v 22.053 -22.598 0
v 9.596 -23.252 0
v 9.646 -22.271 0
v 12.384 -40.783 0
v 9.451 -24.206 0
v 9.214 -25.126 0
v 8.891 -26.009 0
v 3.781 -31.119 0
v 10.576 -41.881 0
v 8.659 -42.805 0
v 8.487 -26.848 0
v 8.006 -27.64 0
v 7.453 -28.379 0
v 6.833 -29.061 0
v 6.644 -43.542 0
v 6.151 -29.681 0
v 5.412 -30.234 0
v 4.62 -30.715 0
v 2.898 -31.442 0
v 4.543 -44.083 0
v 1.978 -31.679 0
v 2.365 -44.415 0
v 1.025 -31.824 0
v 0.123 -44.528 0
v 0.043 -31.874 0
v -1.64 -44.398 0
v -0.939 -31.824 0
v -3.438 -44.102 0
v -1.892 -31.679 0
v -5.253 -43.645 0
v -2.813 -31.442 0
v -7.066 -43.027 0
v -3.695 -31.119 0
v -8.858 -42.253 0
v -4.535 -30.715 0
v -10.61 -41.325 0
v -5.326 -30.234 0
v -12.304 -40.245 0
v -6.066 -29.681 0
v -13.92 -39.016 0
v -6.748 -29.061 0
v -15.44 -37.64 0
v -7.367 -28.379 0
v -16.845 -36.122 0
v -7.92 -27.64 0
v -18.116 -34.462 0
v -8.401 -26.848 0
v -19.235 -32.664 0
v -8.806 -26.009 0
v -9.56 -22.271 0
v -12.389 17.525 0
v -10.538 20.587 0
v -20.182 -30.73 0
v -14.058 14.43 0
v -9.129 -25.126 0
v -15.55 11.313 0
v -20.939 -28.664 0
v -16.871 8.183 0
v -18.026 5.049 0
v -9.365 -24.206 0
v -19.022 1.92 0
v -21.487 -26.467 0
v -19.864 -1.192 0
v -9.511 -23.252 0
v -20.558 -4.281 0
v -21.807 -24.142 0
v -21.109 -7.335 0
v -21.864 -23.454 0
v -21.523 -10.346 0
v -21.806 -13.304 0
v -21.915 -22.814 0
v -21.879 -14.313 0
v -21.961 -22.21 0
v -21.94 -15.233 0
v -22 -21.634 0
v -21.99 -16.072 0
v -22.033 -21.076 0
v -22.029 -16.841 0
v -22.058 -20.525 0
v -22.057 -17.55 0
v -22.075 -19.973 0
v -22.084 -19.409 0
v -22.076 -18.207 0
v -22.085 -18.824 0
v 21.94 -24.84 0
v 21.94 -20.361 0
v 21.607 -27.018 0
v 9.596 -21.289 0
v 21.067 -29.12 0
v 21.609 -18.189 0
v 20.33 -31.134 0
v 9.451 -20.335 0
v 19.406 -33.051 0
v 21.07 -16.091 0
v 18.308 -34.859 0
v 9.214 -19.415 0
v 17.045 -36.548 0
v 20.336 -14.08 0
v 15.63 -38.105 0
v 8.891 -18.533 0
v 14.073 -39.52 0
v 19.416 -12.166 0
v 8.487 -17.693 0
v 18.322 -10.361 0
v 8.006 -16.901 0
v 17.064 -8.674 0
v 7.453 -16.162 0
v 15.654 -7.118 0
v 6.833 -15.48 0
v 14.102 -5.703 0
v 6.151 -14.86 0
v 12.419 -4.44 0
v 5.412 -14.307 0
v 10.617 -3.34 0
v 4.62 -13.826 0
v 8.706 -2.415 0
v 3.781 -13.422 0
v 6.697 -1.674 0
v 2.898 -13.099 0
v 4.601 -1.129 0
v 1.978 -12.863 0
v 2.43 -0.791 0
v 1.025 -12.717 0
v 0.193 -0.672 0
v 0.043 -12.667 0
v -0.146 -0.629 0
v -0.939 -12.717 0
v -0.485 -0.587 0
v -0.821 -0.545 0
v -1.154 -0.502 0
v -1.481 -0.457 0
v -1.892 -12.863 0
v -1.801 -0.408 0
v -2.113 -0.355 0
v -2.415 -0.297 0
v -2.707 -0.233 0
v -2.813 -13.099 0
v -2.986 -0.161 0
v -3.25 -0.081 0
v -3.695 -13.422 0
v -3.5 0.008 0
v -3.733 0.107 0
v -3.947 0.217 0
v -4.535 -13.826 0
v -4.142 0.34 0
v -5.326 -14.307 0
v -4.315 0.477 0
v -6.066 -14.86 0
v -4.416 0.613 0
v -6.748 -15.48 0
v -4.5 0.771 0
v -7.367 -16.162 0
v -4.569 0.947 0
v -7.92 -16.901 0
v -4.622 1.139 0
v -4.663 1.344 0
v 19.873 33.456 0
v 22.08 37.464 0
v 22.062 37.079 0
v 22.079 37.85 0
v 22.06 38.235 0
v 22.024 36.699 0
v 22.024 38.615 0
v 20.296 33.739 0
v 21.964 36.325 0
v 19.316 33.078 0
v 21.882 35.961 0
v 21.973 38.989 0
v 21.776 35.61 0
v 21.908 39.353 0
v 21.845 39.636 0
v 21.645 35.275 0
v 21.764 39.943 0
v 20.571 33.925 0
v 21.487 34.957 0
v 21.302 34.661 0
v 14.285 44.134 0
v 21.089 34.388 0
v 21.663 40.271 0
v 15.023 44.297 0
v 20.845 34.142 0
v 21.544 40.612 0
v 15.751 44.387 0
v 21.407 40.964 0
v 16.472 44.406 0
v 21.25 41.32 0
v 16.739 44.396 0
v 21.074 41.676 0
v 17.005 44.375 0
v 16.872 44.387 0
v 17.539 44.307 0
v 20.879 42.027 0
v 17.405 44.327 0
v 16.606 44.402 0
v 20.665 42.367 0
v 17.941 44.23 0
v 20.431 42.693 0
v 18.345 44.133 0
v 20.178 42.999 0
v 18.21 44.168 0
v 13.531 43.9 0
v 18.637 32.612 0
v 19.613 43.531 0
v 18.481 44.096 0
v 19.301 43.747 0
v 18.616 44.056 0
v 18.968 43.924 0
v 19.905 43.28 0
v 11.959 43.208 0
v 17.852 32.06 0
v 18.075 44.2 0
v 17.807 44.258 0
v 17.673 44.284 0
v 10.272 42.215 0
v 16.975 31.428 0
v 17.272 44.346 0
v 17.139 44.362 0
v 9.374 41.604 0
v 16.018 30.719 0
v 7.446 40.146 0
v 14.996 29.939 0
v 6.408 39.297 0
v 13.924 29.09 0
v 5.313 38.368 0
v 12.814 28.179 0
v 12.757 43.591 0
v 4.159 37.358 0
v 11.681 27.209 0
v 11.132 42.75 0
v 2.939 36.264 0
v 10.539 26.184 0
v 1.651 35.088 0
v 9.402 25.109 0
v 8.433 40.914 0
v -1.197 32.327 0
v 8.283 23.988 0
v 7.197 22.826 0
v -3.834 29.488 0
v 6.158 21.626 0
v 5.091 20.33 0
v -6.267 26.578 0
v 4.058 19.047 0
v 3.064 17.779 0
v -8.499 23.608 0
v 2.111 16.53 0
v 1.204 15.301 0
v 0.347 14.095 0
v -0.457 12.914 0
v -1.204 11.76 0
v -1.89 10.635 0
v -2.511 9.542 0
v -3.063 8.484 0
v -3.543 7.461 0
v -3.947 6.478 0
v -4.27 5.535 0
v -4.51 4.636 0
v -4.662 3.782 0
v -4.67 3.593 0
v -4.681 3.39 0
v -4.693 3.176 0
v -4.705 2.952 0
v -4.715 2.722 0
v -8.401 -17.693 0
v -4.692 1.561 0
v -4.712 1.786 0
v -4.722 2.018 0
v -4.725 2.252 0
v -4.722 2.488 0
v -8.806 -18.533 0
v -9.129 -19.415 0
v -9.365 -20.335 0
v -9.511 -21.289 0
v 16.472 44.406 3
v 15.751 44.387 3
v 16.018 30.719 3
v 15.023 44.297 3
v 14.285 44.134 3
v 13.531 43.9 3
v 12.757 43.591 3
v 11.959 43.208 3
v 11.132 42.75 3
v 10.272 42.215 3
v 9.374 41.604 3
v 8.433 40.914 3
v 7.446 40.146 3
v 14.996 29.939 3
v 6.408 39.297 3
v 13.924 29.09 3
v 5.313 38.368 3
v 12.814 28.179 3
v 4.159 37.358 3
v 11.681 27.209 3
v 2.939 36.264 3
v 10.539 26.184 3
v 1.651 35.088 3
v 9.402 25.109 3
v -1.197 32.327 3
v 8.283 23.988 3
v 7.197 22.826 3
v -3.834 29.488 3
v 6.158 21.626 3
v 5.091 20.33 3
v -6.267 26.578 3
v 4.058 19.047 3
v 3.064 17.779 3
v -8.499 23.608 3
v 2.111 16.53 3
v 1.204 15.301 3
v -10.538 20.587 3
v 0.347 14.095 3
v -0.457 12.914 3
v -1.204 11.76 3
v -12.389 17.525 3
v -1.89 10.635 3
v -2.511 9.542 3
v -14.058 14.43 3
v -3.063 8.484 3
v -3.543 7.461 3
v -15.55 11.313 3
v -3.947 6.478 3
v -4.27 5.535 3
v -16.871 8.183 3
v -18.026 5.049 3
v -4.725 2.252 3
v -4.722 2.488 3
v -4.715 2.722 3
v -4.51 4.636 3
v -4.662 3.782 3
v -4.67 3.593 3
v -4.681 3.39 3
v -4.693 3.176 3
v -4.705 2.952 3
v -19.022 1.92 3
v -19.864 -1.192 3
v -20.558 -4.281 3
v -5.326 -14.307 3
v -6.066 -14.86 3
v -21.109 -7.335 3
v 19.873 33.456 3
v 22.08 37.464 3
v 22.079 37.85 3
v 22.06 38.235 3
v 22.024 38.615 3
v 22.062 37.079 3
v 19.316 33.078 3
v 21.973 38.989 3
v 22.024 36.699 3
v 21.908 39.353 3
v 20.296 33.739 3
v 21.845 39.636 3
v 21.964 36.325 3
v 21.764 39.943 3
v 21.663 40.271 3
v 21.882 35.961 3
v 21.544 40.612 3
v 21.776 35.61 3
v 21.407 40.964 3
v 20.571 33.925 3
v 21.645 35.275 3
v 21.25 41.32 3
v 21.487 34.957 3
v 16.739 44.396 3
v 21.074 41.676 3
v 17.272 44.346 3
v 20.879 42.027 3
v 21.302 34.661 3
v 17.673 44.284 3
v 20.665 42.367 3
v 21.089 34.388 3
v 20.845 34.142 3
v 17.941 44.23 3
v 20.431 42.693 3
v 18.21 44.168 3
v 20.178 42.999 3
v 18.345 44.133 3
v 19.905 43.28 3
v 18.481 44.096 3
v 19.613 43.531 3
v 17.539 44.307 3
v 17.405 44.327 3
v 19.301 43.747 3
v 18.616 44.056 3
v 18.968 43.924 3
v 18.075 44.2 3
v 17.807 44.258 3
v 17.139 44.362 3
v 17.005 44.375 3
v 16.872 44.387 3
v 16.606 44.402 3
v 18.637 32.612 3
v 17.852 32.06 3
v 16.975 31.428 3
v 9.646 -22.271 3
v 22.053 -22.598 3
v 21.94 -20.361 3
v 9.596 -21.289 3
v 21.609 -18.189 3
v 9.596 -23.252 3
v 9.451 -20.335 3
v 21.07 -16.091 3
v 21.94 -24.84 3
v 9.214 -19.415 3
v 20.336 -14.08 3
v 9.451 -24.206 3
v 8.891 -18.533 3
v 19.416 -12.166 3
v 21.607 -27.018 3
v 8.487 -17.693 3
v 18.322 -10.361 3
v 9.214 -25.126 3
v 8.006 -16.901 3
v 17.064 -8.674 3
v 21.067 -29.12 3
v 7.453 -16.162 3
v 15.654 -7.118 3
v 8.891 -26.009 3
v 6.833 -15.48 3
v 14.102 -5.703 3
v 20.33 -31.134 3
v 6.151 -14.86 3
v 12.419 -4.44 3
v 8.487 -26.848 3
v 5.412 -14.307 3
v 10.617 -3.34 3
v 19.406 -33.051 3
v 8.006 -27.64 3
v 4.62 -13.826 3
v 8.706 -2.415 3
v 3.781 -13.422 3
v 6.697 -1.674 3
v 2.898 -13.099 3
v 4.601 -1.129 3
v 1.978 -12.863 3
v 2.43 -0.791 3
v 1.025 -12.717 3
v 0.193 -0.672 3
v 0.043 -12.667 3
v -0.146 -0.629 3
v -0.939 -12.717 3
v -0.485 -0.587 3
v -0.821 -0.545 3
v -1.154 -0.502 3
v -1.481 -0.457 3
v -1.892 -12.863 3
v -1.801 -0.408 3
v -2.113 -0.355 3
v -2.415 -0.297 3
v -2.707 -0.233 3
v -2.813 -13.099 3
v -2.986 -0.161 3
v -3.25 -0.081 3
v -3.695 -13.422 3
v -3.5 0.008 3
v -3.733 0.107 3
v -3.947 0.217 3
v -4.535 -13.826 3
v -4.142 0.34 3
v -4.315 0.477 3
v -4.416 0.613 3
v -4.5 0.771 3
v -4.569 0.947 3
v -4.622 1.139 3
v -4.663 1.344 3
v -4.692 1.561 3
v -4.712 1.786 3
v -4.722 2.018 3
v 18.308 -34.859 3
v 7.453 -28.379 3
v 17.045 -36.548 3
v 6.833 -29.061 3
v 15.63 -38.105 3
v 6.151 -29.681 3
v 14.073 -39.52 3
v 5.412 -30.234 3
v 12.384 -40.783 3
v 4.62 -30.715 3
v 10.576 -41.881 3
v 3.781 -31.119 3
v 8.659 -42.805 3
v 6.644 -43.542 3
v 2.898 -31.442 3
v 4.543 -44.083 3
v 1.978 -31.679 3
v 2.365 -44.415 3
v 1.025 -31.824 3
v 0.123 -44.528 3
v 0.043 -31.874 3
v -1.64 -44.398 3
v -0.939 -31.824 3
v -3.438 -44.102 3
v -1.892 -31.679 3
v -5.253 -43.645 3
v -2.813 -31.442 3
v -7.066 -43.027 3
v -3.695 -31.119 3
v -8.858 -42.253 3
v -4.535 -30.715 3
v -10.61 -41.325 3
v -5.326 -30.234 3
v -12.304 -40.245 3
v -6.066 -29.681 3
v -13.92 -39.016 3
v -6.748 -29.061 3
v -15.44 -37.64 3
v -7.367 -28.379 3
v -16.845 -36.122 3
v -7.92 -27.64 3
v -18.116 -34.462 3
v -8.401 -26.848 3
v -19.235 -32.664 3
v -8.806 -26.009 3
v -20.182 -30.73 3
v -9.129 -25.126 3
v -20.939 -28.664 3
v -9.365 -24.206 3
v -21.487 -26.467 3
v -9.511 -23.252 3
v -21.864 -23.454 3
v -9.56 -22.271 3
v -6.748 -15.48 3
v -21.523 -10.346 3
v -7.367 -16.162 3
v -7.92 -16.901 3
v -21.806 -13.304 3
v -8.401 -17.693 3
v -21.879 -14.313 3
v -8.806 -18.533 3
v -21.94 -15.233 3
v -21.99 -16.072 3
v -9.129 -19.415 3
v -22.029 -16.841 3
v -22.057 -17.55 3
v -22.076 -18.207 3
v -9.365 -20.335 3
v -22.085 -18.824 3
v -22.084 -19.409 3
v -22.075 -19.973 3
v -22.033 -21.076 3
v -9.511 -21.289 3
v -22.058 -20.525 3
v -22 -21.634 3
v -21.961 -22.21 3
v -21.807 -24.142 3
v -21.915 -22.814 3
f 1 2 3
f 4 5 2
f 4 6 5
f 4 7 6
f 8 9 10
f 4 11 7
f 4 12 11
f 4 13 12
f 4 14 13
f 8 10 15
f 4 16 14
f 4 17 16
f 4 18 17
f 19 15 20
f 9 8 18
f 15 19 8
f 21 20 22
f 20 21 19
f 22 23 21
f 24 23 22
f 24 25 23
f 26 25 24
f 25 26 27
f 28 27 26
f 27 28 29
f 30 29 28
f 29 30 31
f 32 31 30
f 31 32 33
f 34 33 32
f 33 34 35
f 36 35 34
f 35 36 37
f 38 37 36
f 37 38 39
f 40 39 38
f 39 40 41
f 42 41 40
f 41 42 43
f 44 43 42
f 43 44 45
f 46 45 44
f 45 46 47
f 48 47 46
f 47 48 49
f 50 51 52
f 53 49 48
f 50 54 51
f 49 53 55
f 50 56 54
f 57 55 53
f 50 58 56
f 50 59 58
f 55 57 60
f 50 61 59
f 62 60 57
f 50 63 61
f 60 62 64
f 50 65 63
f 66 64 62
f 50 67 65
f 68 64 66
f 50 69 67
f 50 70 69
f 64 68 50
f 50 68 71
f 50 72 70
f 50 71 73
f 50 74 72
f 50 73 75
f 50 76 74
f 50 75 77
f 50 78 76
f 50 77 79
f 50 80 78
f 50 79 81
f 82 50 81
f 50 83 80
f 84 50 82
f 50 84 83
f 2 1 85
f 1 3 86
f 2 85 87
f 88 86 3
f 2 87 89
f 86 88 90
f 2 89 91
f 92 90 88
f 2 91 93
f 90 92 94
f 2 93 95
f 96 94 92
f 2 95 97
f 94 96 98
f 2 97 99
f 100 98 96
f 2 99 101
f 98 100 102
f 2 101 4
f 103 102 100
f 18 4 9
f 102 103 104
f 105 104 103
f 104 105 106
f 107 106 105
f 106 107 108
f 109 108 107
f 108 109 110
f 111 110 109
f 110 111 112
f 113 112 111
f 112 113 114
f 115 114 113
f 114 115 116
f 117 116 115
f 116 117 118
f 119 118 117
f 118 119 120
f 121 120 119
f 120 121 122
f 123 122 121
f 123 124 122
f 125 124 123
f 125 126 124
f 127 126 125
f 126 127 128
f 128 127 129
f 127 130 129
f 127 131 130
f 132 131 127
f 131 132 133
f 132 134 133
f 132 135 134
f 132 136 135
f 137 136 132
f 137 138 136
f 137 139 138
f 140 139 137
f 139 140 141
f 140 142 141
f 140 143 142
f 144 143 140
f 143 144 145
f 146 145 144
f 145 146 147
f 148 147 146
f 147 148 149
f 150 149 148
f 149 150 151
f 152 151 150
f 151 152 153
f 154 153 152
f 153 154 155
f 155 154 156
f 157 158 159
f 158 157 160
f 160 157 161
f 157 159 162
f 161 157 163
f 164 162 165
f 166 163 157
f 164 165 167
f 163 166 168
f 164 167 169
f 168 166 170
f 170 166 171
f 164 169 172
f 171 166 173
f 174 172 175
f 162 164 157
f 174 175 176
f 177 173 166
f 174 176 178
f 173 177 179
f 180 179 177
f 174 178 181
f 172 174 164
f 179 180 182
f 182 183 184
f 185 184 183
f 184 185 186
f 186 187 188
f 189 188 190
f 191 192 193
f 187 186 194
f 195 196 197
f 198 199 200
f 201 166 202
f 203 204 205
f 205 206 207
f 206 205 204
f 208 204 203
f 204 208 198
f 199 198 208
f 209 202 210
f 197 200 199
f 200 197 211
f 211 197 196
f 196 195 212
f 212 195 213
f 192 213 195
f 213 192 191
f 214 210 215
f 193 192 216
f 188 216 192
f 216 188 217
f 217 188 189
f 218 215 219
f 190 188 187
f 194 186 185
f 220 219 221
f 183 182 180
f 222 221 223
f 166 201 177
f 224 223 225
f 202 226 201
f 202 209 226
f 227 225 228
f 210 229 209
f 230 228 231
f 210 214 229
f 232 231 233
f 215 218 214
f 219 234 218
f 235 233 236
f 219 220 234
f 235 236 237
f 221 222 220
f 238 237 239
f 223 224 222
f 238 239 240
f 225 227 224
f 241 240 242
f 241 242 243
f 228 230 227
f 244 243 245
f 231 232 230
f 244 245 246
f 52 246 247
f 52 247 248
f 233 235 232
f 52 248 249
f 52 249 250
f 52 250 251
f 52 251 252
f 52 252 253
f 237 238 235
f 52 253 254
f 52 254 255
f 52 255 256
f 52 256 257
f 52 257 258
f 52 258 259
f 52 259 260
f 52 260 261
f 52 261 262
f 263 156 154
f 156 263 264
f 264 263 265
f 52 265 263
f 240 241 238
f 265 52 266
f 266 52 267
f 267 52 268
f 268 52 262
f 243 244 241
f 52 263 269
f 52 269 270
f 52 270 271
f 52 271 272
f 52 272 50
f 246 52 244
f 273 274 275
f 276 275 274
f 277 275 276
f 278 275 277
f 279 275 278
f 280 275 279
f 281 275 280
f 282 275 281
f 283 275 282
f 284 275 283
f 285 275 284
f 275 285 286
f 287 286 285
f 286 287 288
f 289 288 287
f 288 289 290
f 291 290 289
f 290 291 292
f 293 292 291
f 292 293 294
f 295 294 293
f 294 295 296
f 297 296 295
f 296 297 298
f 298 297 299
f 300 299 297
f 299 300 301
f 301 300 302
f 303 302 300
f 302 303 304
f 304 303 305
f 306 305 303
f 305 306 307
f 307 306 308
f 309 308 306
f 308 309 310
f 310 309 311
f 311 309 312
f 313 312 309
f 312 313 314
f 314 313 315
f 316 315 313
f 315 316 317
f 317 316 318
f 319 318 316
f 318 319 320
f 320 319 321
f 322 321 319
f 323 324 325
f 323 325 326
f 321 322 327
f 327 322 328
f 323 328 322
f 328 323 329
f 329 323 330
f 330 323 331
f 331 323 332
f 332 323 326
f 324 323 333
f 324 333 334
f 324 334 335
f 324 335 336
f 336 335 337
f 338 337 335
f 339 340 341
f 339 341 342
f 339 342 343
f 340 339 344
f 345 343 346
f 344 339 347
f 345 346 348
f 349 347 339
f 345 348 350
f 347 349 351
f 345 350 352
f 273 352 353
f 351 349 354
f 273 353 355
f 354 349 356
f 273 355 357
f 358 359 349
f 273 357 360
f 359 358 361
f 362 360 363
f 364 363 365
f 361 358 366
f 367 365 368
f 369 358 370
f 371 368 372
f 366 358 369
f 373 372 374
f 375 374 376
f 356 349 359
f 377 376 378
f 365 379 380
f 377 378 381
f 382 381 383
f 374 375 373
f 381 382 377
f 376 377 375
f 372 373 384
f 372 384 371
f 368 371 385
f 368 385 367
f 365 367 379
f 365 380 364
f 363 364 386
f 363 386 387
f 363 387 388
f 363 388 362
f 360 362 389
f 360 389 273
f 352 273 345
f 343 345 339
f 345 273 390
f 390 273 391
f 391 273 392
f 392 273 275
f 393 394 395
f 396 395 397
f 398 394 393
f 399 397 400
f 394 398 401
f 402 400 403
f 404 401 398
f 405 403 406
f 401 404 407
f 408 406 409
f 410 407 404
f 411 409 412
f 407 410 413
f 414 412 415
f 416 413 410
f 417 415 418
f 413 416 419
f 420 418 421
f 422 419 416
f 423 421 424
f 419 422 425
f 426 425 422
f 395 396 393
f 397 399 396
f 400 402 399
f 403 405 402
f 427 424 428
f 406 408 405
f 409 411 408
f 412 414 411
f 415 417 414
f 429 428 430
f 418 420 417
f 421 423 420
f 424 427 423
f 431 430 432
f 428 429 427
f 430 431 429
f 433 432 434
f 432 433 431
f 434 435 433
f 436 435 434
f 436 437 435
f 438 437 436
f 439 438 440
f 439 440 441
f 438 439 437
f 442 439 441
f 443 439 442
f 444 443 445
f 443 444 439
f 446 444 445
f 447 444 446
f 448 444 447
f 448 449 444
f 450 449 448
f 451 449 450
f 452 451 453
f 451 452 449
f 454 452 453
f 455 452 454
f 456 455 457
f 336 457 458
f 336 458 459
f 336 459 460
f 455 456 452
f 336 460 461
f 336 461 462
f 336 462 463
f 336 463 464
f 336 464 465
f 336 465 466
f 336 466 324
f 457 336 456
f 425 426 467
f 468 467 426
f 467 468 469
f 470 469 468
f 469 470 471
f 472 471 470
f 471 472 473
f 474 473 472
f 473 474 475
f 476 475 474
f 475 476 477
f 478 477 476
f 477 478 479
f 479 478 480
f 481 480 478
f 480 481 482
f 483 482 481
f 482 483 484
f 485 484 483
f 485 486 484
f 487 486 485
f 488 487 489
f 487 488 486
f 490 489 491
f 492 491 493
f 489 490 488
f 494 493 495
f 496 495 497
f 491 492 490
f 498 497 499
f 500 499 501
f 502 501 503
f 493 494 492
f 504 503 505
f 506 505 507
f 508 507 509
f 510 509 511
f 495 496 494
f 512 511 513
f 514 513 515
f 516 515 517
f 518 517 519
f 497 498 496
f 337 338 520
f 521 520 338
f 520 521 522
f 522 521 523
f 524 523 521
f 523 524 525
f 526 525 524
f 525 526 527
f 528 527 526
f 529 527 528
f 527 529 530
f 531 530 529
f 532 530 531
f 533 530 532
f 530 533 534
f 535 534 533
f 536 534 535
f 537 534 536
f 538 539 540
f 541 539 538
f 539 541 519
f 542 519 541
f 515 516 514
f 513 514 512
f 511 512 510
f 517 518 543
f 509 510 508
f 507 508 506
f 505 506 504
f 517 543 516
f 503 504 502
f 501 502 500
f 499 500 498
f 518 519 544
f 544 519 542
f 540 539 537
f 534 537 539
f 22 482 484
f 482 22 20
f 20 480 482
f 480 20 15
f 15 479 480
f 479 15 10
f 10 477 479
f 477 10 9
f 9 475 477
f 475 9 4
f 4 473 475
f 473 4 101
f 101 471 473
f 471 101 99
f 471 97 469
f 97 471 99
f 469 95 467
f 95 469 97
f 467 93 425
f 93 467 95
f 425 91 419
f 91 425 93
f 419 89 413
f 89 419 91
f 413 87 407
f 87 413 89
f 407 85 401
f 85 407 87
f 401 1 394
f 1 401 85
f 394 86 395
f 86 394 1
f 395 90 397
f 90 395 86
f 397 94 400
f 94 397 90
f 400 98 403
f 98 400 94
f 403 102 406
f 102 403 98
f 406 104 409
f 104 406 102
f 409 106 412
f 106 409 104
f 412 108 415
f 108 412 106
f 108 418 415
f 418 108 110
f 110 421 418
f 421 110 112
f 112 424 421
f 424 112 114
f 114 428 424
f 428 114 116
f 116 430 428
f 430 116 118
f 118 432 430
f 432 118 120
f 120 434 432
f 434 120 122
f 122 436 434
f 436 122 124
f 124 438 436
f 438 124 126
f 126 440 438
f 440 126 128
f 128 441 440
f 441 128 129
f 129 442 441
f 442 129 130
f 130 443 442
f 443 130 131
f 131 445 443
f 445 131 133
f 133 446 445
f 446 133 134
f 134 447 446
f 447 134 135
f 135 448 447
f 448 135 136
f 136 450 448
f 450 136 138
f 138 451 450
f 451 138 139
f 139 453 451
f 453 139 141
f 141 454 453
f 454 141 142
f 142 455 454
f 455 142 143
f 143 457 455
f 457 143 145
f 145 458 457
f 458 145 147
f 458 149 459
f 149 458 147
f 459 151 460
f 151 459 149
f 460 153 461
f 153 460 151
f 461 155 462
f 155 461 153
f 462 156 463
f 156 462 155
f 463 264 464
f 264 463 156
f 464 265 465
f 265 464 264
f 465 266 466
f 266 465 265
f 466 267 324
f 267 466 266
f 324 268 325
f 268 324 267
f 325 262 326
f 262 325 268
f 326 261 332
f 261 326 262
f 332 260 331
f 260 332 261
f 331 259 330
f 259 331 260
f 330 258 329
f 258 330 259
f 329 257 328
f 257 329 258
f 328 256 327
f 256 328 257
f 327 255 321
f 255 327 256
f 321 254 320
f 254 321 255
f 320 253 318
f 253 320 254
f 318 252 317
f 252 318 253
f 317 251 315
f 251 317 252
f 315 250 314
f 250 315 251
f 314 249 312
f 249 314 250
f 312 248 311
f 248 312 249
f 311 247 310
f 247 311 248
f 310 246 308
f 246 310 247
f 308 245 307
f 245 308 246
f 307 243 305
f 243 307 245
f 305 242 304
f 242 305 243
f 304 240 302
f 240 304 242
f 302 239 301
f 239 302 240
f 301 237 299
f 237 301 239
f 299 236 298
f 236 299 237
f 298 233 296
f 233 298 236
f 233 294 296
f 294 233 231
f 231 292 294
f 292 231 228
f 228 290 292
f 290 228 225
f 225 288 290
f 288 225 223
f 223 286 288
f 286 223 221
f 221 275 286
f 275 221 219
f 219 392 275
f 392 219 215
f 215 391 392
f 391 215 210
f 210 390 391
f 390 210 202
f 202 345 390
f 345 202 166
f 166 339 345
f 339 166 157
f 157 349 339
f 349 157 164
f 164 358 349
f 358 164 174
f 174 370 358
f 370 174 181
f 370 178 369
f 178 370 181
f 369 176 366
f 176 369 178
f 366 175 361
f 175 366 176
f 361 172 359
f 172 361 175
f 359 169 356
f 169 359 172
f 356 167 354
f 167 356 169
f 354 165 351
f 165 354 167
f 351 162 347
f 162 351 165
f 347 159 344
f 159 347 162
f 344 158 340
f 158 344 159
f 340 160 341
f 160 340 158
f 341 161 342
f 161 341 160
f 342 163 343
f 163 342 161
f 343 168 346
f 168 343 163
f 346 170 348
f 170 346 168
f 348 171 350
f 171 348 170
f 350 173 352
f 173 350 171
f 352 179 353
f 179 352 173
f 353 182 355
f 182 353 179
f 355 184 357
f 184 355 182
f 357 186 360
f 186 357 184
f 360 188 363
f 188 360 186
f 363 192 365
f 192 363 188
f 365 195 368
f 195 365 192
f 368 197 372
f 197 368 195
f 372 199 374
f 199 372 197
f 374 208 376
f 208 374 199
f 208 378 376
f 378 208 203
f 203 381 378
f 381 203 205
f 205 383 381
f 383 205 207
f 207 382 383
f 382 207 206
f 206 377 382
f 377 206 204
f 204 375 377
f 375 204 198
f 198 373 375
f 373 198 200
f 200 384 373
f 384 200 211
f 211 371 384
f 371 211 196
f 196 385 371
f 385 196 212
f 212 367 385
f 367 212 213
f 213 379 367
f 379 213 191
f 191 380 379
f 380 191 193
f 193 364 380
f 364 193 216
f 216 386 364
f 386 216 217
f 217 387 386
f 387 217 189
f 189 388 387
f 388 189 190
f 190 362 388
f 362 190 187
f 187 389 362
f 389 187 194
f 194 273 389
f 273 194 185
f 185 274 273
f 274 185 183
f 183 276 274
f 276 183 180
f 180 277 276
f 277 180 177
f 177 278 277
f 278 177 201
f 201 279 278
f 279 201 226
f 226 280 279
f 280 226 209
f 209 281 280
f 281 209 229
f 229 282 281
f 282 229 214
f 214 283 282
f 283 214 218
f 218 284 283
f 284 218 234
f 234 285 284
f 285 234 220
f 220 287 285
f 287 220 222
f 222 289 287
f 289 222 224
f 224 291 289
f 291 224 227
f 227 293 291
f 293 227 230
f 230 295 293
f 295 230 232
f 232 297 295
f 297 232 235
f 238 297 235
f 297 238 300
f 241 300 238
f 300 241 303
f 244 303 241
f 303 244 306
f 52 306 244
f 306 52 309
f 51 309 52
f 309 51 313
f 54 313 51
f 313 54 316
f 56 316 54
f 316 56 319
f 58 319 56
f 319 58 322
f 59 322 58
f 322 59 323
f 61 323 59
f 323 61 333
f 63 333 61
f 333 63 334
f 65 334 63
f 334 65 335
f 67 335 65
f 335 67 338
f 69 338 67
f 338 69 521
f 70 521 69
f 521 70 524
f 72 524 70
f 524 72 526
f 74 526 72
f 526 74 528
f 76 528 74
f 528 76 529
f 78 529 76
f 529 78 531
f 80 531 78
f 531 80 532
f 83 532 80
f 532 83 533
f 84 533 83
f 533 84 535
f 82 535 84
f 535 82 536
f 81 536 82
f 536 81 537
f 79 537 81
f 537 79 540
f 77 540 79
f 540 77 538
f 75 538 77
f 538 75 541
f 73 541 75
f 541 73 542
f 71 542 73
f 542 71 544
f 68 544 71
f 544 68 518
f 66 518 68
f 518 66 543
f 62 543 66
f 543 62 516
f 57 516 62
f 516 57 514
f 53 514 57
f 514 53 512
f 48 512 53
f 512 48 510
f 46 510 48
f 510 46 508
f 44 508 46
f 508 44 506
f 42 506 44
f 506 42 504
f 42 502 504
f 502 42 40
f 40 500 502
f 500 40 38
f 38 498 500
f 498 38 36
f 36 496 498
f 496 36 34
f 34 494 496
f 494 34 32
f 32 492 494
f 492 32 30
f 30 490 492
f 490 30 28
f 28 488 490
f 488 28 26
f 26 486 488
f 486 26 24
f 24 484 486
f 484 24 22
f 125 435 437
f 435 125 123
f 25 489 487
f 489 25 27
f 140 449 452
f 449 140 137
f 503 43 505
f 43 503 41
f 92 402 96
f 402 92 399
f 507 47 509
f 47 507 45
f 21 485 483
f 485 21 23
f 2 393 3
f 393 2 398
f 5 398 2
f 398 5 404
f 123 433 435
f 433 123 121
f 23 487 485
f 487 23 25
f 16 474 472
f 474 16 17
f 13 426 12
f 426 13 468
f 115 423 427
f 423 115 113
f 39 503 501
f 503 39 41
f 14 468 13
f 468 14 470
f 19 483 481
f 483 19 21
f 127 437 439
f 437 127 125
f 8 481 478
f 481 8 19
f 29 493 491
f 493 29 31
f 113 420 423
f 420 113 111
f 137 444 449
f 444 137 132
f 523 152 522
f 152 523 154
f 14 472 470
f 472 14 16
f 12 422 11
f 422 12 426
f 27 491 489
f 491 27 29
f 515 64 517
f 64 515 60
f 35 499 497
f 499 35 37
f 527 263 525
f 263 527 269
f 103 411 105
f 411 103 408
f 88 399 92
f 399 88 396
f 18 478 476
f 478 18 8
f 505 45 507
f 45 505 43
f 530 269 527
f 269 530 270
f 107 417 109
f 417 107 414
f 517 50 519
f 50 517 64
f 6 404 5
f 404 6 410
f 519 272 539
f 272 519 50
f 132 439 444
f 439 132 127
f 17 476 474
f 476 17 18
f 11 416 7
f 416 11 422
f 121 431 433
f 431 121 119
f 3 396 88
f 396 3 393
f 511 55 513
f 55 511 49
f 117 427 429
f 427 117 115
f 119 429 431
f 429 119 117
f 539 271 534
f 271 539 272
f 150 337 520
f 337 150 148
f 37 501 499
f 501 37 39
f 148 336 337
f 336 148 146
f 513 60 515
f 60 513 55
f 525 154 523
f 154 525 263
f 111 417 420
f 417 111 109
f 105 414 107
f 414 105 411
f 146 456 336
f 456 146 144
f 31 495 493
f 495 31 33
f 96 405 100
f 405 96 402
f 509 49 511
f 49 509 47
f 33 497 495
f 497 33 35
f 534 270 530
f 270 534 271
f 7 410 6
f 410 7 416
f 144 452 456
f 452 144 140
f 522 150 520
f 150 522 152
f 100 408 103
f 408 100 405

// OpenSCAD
// Generated from 交通部公路局（原交通部公路總局）「新式號牌使用之英文字、數字字體」author trace
fudge = 0.1;

module glyph_2012_6(h = 3) {
  difference() {
    linear_extrude(height = h)
      polygon(points = [[16.4725, 44.4064], [15.7511, 44.3869], [15.0234, 44.2966], [14.2848, 44.1344], [13.5309, 43.8996], [12.7572, 43.5912], [11.9591, 43.2083], [11.1322, 42.75], [10.2719, 42.2155], [9.3739, 41.6039], [8.4335, 40.9142], [7.4463, 40.1457], [6.4078, 39.2973], [5.3134, 38.3682], [4.1588, 37.3576], [2.9393, 36.2645], [1.6506, 35.088], [-1.1973, 32.3275], [-3.8345, 29.4878], [-6.2666, 26.5781], [-8.4993, 23.6081], [-10.5383, 20.5871], [-12.3893, 17.5247], [-14.0579, 14.4302], [-15.5498, 11.313], [-16.8707, 8.1828], [-18.0263, 5.0488], [-19.0223, 1.9205], [-19.8643, -1.1925], [-20.5579, -4.281], [-21.109, -7.3353], [-21.5231, -10.3461], [-21.8059, -13.3039], [-21.879, -14.3135], [-21.9402, -15.2331], [-21.9901, -16.0725], [-22.029, -16.8415], [-22.0574, -17.5499], [-22.0758, -18.2075], [-22.0846, -18.824], [-22.0842, -19.4093], [-22.0752, -19.9732], [-22.0579, -20.5254], [-22.0329, -21.0758], [-22.0005, -21.6341], [-21.9612, -22.2101], [-21.9155, -22.8137], [-21.8638, -23.4545], [-21.8066, -24.1425], [-21.4866, -26.4668], [-20.9387, -28.6636], [-20.1818, -30.7302], [-19.2346, -32.6638], [-18.116, -34.4618], [-16.8448, -36.1216], [-15.4398, -37.6404], [-13.9198, -39.0157], [-12.3036, -40.2447], [-10.61, -41.3248], [-8.8579, -42.2532], [-7.066, -43.0274], [-5.2531, -43.6447], [-3.4381, -44.1024], [-1.6397, -44.3977], [0.1232, -44.5282], [2.3654, -44.4149], [4.5428, -44.0826], [6.6444, -43.5422], [8.6593, -42.8048], [10.5762, -41.8813], [12.3843, -40.7829], [14.0726, -39.5204], [15.6299, -38.105], [17.0453, -36.5477], [18.3077, -34.8595], [19.4062, -33.0514], [20.3296, -31.1344], [21.0671, -29.1196], [21.6075, -27.018], [21.9398, -24.8405], [22.053, -22.5983], [21.94, -20.3613], [21.6089, -18.1886], [21.0705, -16.0913], [20.3359, -14.0802], [19.416, -12.1664], [18.3216, -10.3608], [17.0639, -8.6745], [15.6536, -7.1183], [14.1017, -5.7033], [12.4192, -4.4403], [10.617, -3.3405], [8.706, -2.4147], [6.6972, -1.674], [4.6015, -1.1292], [2.4298, -0.7914], [0.1931, -0.6716], [-0.1465, -0.6289], [-0.4851, -0.5872], [-0.8213, -0.5452], [-1.1536, -0.502], [-1.4806, -0.4566], [-1.8009, -0.408], [-2.1129, -0.3552], [-2.4154, -0.2971], [-2.7068, -0.2328], [-2.9856, -0.1613], [-3.2505, -0.0815], [-3.5, 0.0076], [-3.7327, 0.1069], [-3.9471, 0.2175], [-4.1417, 0.3405], [-4.3152, 0.4767], [-4.4165, 0.6131], [-4.5005, 0.7706], [-4.5687, 0.9467], [-4.6225, 1.1388], [-4.6633, 1.3445], [-4.6925, 1.5612], [-4.7116, 1.7864], [-4.722, 2.0176], [-4.7251, 2.2523], [-4.7223, 2.488], [-4.7151, 2.7222], [-4.7048, 2.9523], [-4.693, 3.1759], [-4.681, 3.3903], [-4.6702, 3.5932], [-4.6621, 3.782], [-4.5101, 4.6358], [-4.2704, 5.5351], [-3.9468, 6.4777], [-3.5431, 7.4613], [-3.0631, 8.4836], [-2.5107, 9.5422], [-1.8896, 10.635], [-1.2038, 11.7596], [-0.457, 12.9137], [0.347, 14.095], [1.2044, 15.3013], [2.1113, 16.5302], [3.0639, 17.7794], [4.0584, 19.0467], [5.091, 20.3297], [6.1578, 21.6262], [7.1972, 22.8257], [8.2831, 23.9881], [9.4017, 25.109], [10.539, 26.184], [11.681, 27.2089], [12.8139, 28.1791], [13.9236, 29.0905], [14.9963, 29.9387], [16.0179, 30.7192], [16.9747, 31.4278], [17.8525, 32.0601], [18.6375, 32.6118], [19.3158, 33.0785], [19.8734, 33.4559], [20.2963, 33.7395], [20.5706, 33.9251], [20.8453, 34.1418], [21.0889, 34.3879], [21.3025, 34.6606], [21.4874, 34.9571], [21.6448, 35.2746], [21.7759, 35.6103], [21.882, 35.9614], [21.9642, 36.3251], [22.0237, 36.6986], [22.0618, 37.0792], [22.0797, 37.4639], [22.0786, 37.85], [22.0597, 38.2348], [22.0242, 38.6153], [21.9734, 38.9889], [21.9084, 39.3527], [21.8453, 39.6359], [21.7637, 39.9435], [21.6634, 40.2707], [21.5444, 40.6124], [21.4066, 40.9638], [21.2498, 41.3199], [21.074, 41.6759], [20.879, 42.0267], [20.6647, 42.3674], [20.4311, 42.6931], [20.1779, 42.9989], [19.9052, 43.2798], [19.6128, 43.5309], [19.3006, 43.7474], [18.9684, 43.9241], [18.6163, 44.0563], [18.4806, 44.0957], [18.3452, 44.1329], [18.2102, 44.1677], [18.0755, 44.2002], [17.941, 44.2303], [17.8068, 44.2581], [17.6729, 44.2836], [17.5391, 44.3067], [17.4055, 44.3274], [17.272, 44.3458], [17.1386, 44.3618], [17.0053, 44.3755], [16.8721, 44.3868], [16.7389, 44.3957], [16.6057, 44.4022], [16.4724, 44.4063], [16.4724, 44.4063], [16.4724, 44.4063], [16.4724, 44.4063], [16.4724, 44.4063], [16.4724, 44.4063], [16.4724, 44.4063], [16.4724, 44.4063], [16.4724, 44.4063], [16.4724, 44.4063], [16.4725, 44.4063], [16.4725, 44.4063], [16.4725, 44.4063], [16.4725, 44.4063], [16.4725, 44.4063], [16.4725, 44.4063]]);
    translate([0, 0, -fudge])
      linear_extrude(height = h + 2 * fudge)
        polygon(points = [[0.0428, -12.6675], [1.0247, -12.717], [1.9782, -12.8626], [2.8985, -13.0992], [3.7808, -13.4221], [4.6203, -13.8265], [5.412, -14.3075], [6.1513, -14.8603], [6.8333, -15.4801], [7.4531, -16.1621], [8.0059, -16.9014], [8.4869, -17.6932], [8.8913, -18.5326], [9.2142, -19.4149], [9.4509, -20.3352], [9.5964, -21.2887], [9.646, -22.2706], [9.5964, -23.2524], [9.4509, -24.2059], [9.2142, -25.1263], [8.8913, -26.0086], [8.4869, -26.848], [8.0059, -27.6398], [7.4531, -28.3791], [6.8333, -29.061], [6.1513, -29.6808], [5.412, -30.2337], [4.6203, -30.7147], [3.7808, -31.119], [2.8985, -31.442], [1.9782, -31.6786], [1.0247, -31.8241], [0.0428, -31.8737], [-0.939, -31.8241], [-1.8925, -31.6786], [-2.8128, -31.442], [-3.6951, -31.119], [-4.5346, -30.7147], [-5.3264, -30.2337], [-6.0656, -29.6808], [-6.7476, -29.061], [-7.3674, -28.3791], [-7.9202, -27.6398], [-8.4012, -26.848], [-8.8056, -26.0086], [-9.1286, -25.1263], [-9.3652, -24.2059], [-9.5107, -23.2524], [-9.5603, -22.2706], [-9.5107, -21.2887], [-9.3652, -20.3352], [-9.1286, -19.4149], [-8.8056, -18.5326], [-8.4012, -17.6932], [-7.9202, -16.9014], [-7.3674, -16.1621], [-6.7476, -15.4801], [-6.0656, -14.8603], [-5.3264, -14.3075], [-4.5346, -13.8265], [-3.6951, -13.4221], [-2.8128, -13.0992], [-1.8925, -12.8626], [-0.939, -12.717]]);
  }
}

glyph_2012_6();
